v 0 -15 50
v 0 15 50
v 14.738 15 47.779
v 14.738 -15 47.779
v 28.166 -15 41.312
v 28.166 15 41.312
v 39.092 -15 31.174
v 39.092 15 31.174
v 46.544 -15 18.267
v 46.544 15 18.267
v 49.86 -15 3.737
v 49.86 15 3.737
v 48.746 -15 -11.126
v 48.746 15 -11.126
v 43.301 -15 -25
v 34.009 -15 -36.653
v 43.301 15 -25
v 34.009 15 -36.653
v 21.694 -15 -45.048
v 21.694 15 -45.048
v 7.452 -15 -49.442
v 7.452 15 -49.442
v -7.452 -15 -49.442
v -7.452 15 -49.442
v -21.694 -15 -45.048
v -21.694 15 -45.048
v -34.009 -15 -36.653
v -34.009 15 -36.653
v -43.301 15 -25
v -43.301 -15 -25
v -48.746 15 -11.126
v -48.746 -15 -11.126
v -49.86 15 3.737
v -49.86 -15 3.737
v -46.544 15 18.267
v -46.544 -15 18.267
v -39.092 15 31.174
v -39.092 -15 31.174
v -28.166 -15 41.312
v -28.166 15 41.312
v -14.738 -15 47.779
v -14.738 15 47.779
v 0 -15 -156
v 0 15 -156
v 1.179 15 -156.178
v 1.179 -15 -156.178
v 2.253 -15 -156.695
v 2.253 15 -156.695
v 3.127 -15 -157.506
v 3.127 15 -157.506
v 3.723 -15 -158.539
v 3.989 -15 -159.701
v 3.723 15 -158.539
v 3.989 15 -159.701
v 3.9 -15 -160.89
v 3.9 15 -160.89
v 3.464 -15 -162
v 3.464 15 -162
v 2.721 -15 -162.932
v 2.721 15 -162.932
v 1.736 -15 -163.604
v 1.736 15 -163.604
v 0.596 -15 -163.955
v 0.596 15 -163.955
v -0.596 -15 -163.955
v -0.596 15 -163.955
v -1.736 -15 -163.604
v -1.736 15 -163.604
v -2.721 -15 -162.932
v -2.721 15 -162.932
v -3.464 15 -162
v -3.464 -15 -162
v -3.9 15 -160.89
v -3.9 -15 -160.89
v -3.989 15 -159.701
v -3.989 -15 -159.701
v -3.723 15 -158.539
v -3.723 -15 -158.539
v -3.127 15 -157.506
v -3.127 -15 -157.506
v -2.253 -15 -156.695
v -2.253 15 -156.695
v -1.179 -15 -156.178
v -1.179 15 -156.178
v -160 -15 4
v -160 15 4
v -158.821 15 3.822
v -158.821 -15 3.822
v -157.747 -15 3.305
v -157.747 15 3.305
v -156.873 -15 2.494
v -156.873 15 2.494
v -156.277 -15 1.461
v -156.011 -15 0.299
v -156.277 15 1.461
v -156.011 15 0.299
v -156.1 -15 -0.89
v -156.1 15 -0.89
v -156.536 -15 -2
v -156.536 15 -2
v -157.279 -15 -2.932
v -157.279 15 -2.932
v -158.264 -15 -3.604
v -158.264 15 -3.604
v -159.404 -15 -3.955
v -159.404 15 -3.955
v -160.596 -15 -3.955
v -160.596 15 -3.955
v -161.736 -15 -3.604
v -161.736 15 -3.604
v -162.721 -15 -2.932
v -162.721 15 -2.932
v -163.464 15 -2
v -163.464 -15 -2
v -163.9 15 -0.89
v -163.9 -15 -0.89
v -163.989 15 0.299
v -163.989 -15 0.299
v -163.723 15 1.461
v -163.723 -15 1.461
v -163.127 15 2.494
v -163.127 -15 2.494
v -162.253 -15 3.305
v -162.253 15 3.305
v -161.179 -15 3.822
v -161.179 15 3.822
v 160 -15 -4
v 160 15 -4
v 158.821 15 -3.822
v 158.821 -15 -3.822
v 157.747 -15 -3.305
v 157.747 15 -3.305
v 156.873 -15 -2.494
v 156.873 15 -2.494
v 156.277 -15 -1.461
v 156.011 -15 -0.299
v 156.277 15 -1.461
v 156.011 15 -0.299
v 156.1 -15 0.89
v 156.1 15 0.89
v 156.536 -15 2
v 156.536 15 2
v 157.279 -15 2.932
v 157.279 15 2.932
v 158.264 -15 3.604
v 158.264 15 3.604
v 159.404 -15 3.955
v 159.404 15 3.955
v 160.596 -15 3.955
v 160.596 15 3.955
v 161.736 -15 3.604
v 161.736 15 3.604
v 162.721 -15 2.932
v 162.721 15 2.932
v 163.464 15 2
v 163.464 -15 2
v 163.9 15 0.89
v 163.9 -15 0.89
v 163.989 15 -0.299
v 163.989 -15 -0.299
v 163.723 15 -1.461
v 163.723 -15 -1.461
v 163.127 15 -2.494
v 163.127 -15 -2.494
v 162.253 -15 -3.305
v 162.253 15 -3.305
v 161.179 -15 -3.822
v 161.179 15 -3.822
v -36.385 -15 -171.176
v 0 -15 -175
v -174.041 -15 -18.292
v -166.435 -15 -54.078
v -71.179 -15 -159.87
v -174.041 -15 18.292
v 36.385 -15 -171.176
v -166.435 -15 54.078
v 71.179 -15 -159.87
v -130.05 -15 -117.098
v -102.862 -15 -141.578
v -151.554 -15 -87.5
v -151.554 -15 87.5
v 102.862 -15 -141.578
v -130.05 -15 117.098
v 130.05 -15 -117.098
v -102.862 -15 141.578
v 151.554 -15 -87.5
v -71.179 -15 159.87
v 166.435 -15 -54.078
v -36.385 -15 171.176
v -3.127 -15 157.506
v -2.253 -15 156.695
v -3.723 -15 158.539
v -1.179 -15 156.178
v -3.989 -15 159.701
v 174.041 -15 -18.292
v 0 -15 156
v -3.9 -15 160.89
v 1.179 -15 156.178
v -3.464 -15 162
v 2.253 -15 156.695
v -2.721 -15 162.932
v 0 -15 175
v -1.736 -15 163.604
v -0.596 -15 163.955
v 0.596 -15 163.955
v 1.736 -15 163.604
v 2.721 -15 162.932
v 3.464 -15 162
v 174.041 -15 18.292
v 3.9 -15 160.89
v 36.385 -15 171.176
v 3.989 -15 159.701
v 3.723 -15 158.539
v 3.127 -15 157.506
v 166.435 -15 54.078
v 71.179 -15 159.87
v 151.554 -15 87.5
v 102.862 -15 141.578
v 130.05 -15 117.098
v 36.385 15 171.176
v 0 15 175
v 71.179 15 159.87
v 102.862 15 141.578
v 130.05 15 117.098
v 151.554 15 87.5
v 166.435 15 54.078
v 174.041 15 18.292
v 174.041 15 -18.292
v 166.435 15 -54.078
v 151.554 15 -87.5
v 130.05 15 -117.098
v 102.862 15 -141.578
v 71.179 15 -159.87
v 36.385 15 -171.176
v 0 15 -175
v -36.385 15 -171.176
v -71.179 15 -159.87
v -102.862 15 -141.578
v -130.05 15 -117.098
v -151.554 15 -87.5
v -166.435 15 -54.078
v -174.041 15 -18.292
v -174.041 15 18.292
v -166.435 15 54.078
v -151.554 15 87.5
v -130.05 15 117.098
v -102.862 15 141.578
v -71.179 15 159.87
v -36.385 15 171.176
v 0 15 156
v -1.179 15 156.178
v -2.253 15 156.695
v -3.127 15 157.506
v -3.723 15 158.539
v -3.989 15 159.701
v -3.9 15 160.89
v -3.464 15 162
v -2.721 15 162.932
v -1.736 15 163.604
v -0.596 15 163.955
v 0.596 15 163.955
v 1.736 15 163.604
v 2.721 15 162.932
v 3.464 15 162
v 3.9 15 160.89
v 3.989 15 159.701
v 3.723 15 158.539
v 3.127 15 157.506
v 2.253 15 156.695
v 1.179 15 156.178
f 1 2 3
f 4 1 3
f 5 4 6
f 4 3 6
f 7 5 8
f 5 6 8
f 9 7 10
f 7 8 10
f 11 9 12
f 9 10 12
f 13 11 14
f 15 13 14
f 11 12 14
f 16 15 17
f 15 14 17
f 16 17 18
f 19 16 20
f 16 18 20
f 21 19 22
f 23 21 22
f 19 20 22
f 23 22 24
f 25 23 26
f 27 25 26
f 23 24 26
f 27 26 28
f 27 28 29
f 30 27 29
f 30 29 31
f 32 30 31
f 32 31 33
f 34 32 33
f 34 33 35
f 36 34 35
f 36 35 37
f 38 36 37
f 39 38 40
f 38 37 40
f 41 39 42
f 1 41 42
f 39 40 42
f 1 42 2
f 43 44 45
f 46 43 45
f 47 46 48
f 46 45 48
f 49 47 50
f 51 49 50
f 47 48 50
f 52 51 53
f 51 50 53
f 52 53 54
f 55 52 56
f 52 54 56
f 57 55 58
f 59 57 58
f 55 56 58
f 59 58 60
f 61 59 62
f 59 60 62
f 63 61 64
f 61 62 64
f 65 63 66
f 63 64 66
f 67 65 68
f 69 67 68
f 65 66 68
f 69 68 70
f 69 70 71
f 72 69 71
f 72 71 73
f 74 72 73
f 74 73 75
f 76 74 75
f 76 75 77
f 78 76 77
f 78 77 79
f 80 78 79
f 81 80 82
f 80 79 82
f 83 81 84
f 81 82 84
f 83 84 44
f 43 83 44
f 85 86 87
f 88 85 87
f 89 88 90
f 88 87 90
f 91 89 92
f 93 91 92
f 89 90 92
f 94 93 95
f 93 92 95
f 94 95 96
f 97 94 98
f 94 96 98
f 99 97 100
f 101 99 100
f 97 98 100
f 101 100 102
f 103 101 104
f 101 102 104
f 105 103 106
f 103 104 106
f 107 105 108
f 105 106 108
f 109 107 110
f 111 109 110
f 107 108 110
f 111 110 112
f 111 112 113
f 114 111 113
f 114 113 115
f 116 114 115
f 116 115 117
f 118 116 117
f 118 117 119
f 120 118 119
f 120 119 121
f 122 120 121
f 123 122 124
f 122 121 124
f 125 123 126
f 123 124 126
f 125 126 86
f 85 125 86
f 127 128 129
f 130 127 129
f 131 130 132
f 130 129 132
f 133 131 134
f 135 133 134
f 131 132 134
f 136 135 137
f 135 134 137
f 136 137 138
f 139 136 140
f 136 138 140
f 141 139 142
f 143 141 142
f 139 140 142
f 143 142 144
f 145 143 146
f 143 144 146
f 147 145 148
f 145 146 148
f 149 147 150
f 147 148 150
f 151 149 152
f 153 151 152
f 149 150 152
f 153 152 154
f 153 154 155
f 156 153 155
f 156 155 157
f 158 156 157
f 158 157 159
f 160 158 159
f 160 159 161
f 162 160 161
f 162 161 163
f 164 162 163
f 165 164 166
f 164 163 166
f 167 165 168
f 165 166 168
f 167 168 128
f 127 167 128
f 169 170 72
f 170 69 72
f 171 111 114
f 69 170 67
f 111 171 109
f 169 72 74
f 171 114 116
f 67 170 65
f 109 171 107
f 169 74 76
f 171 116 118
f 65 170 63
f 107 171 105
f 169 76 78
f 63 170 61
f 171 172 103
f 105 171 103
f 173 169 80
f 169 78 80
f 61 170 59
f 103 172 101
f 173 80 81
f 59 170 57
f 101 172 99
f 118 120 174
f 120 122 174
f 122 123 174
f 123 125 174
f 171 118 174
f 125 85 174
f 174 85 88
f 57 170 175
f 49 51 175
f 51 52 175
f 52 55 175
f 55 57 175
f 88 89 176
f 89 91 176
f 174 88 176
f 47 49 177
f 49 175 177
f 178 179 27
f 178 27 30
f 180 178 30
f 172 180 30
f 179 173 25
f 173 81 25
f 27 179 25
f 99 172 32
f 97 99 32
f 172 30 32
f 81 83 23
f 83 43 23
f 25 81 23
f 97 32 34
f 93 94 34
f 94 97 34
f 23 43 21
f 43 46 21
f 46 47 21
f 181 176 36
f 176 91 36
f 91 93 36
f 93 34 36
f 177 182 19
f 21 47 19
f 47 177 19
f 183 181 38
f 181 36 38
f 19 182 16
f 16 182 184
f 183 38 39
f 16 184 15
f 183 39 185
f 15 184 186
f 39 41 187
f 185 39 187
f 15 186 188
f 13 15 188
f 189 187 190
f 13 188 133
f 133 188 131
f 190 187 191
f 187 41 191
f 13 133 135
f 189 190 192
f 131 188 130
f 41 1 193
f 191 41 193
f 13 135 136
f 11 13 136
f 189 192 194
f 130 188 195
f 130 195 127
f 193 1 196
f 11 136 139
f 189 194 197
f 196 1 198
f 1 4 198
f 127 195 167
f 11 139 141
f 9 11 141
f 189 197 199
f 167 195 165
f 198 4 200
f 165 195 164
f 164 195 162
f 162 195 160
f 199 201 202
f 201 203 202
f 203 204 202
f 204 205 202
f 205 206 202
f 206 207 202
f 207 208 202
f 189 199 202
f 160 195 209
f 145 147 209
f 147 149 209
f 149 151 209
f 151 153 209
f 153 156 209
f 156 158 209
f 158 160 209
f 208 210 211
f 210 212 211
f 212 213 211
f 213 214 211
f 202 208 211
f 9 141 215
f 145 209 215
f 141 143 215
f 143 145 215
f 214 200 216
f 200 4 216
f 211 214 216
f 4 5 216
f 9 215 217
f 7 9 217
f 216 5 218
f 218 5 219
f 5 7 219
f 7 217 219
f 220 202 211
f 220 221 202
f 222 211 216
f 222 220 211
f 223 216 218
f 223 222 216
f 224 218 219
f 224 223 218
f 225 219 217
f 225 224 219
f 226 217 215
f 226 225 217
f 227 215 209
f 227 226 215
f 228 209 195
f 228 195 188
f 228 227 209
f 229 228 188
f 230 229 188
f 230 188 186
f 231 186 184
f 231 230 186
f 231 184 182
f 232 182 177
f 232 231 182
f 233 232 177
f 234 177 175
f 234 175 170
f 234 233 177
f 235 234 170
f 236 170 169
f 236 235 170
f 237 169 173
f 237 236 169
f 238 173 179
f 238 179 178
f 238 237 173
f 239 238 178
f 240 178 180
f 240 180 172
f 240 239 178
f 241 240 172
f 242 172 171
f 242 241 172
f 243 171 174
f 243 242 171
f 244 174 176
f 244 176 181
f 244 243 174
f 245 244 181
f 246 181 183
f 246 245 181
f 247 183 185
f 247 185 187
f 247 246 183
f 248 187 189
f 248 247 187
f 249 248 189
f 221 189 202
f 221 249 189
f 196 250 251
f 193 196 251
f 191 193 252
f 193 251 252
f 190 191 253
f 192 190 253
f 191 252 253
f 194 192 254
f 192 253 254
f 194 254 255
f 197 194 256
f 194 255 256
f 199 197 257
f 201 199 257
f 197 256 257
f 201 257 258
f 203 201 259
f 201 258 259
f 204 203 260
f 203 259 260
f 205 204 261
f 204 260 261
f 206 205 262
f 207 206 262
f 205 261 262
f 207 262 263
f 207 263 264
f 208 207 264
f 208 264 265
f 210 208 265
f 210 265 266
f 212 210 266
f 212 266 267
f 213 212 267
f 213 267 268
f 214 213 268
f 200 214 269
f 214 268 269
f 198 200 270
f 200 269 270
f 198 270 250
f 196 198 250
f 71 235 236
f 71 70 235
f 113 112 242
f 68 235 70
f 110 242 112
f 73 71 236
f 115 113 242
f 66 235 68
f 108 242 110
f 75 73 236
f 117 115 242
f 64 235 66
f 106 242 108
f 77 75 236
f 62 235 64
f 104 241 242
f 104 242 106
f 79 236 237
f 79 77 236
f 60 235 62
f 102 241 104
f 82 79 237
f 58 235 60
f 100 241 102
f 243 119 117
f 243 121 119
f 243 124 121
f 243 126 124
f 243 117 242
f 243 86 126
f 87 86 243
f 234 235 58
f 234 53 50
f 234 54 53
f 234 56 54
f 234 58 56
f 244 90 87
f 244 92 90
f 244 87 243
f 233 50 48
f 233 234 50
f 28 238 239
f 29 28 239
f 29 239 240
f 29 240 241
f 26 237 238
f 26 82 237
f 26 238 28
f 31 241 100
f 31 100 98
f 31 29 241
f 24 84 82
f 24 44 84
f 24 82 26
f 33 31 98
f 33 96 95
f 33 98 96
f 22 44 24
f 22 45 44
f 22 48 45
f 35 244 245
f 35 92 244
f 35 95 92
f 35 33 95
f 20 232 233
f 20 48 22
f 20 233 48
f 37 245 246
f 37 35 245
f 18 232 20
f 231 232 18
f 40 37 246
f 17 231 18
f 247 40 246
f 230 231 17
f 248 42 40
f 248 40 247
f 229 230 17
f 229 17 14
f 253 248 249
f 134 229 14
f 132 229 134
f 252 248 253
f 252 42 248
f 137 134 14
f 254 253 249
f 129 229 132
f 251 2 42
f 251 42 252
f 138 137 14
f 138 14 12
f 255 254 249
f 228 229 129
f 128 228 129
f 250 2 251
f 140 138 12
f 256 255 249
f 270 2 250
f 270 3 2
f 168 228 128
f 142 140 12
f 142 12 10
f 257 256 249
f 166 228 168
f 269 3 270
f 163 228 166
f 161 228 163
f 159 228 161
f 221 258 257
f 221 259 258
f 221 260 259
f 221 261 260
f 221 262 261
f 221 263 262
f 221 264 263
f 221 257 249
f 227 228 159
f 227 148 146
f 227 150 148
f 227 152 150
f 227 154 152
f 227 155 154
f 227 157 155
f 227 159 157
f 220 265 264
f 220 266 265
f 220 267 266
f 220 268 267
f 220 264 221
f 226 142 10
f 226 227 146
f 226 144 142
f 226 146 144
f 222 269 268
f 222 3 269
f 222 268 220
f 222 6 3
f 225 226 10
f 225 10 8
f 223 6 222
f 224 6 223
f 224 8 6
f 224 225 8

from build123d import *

# Parameters (mm, degrees)
SKETCH2_R           = 175
BOSS_EXTRUDE1_DEPTH = 15
SKETCH3_R           = 4
SKETCH3_R_2         = 50
CUT_EXTRUDE1_DEPTH  = 30


with BuildPart() as part:
    # Sketch2 → Boss-Extrude1 (new, symmetric)
    with BuildSketch(Plane(origin=(0, 0, 0), x_dir=(1, 0, 0), z_dir=(0, 1, 0))):
        with Locations(Location((0, 0, 0), (0, 0, 270))):
            Circle(SKETCH2_R)
    extrude(amount=BOSS_EXTRUDE1_DEPTH, both=True)

    # Sketch3 → Cut-Extrude1 (cut)
    with BuildSketch(Plane(origin=(0, 15, 0), x_dir=(1, 0, 0), z_dir=(0, 1, 0))):
        with Locations(Location((0, 160, 0), (0, 0, 270))):
            Circle(SKETCH3_R)
        with Locations(Location((0, -160, 0), (0, 0, 90))):
            Circle(SKETCH3_R)
        with Locations(Location((-160, 0, 0), (0, 0, 270))):
            Circle(SKETCH3_R)
        with Locations(Location((160, 0, 0), (0, 0, 90))):
            Circle(SKETCH3_R)
        with Locations(Location((0, 0, 0), (0, 0, 270))):
            Circle(SKETCH3_R_2)
    extrude(amount=-CUT_EXTRUDE1_DEPTH, mode=Mode.SUBTRACT)


solid = part.part
